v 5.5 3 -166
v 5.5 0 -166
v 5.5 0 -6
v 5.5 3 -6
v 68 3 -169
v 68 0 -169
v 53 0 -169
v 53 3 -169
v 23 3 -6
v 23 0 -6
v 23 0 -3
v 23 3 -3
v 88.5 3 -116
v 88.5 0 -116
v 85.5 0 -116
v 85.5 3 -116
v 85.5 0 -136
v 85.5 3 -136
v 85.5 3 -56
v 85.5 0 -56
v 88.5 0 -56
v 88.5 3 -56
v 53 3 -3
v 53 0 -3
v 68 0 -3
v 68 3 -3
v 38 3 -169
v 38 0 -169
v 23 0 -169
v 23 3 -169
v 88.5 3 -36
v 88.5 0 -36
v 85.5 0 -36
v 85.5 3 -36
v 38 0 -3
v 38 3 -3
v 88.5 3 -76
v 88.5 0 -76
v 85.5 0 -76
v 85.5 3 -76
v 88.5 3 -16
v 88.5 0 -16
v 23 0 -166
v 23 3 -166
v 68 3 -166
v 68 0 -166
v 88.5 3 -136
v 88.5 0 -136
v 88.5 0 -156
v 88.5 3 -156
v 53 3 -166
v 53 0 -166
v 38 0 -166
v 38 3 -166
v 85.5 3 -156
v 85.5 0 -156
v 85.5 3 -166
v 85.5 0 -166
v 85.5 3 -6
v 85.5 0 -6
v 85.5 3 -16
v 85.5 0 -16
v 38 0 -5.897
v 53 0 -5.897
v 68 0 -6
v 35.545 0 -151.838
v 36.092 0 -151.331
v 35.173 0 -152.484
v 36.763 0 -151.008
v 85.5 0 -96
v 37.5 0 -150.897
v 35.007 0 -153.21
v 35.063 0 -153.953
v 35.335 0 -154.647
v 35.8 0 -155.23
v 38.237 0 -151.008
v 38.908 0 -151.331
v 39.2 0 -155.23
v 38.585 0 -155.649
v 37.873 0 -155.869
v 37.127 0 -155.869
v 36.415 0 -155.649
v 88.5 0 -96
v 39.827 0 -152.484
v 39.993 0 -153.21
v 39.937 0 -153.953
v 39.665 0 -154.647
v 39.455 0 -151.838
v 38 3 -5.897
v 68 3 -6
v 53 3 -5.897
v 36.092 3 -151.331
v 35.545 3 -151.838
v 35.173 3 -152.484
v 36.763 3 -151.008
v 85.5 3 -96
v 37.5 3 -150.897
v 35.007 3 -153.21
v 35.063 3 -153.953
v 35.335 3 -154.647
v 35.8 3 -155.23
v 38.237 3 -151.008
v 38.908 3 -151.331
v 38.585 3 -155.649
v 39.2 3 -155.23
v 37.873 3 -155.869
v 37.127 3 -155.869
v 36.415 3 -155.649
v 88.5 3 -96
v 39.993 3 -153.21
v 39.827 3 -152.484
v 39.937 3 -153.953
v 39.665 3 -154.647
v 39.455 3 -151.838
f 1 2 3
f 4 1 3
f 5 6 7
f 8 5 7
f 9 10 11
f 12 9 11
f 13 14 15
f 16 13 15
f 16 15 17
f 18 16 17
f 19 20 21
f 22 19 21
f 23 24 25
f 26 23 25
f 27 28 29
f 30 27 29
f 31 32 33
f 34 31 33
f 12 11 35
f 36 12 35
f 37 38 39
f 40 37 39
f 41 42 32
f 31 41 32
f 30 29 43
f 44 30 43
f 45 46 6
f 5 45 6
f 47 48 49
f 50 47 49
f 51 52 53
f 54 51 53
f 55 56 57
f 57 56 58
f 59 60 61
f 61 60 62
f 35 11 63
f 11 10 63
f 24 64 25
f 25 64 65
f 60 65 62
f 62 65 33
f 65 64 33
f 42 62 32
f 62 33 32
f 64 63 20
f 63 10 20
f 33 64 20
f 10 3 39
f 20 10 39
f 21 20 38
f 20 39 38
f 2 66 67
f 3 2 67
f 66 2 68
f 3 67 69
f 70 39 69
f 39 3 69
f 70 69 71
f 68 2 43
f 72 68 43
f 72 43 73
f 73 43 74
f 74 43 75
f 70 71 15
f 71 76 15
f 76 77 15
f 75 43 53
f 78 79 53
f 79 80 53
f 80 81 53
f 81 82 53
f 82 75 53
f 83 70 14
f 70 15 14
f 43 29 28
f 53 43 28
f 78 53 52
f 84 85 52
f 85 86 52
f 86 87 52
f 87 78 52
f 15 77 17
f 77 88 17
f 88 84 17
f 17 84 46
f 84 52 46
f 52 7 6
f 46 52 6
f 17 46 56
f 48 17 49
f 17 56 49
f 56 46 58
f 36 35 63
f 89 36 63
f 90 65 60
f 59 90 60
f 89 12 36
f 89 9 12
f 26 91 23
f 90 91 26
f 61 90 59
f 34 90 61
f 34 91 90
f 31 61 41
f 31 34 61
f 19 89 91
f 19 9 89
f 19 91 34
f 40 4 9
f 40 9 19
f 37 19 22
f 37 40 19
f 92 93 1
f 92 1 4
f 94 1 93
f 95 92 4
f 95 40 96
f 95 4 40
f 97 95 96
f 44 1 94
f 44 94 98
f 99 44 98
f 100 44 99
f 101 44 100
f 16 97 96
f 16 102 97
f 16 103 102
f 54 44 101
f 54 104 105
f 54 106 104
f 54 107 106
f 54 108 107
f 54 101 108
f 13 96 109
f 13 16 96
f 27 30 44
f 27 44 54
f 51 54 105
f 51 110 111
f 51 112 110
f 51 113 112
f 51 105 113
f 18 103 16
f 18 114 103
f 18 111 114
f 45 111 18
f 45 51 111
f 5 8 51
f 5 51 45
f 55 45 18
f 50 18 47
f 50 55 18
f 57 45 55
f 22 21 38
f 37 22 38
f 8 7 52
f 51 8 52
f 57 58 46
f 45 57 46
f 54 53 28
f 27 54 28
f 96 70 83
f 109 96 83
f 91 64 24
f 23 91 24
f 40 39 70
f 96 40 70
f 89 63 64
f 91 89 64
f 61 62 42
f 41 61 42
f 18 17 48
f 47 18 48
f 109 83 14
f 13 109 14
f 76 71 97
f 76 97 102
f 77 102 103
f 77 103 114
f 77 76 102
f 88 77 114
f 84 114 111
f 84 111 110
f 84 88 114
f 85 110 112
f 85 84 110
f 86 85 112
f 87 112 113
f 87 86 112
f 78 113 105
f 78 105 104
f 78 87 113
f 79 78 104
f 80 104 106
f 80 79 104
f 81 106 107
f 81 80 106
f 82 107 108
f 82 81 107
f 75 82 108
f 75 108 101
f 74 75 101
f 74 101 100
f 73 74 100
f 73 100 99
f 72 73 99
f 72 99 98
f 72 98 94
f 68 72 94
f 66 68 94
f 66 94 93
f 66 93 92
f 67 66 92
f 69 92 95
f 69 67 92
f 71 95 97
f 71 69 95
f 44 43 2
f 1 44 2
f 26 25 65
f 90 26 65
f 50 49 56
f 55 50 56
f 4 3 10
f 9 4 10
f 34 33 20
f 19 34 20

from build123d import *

# Parameters (mm, degrees)
CROQUIS1_R              = 2.5
SALIENTE_EXTRUIR1_DEPTH = 3


with BuildPart() as part:
    # Croquis1 → Saliente-Extruir1 (new body)
    with BuildSketch(Plane(origin=(0, 0, 0), x_dir=(1, 0, 0), z_dir=(0, 1, 0))):
        Polygon((23, 3), (38, 3), (38, 5.896935859), (53, 5.896935859), (53, 3), (68, 3), (68, 6), (85.5, 6), (85.5, 16), (88.5, 16), (88.5, 36), (85.5, 36), (85.5, 56), (88.5, 56), (88.5, 76), (85.5, 76), (85.5, 96), (88.5, 96), (88.5, 116), (85.5, 116), (85.5, 136), (88.5, 136), (88.5, 156), (85.5, 156), (85.5, 166), (68, 166), (68, 169), (53, 169), (53, 166), (38, 166), (38, 169), (23, 169), (23, 166), (5.5, 166), (5.5, 153), (5.5, 13), (5.5, 6), (23, 6), align=None)
        with Locations(Location((37.5, 153.396935859, 0), (0, 0, 270))):
            Circle(CROQUIS1_R, mode=Mode.SUBTRACT)
    extrude(amount=SALIENTE_EXTRUIR1_DEPTH)


solid = part.part
